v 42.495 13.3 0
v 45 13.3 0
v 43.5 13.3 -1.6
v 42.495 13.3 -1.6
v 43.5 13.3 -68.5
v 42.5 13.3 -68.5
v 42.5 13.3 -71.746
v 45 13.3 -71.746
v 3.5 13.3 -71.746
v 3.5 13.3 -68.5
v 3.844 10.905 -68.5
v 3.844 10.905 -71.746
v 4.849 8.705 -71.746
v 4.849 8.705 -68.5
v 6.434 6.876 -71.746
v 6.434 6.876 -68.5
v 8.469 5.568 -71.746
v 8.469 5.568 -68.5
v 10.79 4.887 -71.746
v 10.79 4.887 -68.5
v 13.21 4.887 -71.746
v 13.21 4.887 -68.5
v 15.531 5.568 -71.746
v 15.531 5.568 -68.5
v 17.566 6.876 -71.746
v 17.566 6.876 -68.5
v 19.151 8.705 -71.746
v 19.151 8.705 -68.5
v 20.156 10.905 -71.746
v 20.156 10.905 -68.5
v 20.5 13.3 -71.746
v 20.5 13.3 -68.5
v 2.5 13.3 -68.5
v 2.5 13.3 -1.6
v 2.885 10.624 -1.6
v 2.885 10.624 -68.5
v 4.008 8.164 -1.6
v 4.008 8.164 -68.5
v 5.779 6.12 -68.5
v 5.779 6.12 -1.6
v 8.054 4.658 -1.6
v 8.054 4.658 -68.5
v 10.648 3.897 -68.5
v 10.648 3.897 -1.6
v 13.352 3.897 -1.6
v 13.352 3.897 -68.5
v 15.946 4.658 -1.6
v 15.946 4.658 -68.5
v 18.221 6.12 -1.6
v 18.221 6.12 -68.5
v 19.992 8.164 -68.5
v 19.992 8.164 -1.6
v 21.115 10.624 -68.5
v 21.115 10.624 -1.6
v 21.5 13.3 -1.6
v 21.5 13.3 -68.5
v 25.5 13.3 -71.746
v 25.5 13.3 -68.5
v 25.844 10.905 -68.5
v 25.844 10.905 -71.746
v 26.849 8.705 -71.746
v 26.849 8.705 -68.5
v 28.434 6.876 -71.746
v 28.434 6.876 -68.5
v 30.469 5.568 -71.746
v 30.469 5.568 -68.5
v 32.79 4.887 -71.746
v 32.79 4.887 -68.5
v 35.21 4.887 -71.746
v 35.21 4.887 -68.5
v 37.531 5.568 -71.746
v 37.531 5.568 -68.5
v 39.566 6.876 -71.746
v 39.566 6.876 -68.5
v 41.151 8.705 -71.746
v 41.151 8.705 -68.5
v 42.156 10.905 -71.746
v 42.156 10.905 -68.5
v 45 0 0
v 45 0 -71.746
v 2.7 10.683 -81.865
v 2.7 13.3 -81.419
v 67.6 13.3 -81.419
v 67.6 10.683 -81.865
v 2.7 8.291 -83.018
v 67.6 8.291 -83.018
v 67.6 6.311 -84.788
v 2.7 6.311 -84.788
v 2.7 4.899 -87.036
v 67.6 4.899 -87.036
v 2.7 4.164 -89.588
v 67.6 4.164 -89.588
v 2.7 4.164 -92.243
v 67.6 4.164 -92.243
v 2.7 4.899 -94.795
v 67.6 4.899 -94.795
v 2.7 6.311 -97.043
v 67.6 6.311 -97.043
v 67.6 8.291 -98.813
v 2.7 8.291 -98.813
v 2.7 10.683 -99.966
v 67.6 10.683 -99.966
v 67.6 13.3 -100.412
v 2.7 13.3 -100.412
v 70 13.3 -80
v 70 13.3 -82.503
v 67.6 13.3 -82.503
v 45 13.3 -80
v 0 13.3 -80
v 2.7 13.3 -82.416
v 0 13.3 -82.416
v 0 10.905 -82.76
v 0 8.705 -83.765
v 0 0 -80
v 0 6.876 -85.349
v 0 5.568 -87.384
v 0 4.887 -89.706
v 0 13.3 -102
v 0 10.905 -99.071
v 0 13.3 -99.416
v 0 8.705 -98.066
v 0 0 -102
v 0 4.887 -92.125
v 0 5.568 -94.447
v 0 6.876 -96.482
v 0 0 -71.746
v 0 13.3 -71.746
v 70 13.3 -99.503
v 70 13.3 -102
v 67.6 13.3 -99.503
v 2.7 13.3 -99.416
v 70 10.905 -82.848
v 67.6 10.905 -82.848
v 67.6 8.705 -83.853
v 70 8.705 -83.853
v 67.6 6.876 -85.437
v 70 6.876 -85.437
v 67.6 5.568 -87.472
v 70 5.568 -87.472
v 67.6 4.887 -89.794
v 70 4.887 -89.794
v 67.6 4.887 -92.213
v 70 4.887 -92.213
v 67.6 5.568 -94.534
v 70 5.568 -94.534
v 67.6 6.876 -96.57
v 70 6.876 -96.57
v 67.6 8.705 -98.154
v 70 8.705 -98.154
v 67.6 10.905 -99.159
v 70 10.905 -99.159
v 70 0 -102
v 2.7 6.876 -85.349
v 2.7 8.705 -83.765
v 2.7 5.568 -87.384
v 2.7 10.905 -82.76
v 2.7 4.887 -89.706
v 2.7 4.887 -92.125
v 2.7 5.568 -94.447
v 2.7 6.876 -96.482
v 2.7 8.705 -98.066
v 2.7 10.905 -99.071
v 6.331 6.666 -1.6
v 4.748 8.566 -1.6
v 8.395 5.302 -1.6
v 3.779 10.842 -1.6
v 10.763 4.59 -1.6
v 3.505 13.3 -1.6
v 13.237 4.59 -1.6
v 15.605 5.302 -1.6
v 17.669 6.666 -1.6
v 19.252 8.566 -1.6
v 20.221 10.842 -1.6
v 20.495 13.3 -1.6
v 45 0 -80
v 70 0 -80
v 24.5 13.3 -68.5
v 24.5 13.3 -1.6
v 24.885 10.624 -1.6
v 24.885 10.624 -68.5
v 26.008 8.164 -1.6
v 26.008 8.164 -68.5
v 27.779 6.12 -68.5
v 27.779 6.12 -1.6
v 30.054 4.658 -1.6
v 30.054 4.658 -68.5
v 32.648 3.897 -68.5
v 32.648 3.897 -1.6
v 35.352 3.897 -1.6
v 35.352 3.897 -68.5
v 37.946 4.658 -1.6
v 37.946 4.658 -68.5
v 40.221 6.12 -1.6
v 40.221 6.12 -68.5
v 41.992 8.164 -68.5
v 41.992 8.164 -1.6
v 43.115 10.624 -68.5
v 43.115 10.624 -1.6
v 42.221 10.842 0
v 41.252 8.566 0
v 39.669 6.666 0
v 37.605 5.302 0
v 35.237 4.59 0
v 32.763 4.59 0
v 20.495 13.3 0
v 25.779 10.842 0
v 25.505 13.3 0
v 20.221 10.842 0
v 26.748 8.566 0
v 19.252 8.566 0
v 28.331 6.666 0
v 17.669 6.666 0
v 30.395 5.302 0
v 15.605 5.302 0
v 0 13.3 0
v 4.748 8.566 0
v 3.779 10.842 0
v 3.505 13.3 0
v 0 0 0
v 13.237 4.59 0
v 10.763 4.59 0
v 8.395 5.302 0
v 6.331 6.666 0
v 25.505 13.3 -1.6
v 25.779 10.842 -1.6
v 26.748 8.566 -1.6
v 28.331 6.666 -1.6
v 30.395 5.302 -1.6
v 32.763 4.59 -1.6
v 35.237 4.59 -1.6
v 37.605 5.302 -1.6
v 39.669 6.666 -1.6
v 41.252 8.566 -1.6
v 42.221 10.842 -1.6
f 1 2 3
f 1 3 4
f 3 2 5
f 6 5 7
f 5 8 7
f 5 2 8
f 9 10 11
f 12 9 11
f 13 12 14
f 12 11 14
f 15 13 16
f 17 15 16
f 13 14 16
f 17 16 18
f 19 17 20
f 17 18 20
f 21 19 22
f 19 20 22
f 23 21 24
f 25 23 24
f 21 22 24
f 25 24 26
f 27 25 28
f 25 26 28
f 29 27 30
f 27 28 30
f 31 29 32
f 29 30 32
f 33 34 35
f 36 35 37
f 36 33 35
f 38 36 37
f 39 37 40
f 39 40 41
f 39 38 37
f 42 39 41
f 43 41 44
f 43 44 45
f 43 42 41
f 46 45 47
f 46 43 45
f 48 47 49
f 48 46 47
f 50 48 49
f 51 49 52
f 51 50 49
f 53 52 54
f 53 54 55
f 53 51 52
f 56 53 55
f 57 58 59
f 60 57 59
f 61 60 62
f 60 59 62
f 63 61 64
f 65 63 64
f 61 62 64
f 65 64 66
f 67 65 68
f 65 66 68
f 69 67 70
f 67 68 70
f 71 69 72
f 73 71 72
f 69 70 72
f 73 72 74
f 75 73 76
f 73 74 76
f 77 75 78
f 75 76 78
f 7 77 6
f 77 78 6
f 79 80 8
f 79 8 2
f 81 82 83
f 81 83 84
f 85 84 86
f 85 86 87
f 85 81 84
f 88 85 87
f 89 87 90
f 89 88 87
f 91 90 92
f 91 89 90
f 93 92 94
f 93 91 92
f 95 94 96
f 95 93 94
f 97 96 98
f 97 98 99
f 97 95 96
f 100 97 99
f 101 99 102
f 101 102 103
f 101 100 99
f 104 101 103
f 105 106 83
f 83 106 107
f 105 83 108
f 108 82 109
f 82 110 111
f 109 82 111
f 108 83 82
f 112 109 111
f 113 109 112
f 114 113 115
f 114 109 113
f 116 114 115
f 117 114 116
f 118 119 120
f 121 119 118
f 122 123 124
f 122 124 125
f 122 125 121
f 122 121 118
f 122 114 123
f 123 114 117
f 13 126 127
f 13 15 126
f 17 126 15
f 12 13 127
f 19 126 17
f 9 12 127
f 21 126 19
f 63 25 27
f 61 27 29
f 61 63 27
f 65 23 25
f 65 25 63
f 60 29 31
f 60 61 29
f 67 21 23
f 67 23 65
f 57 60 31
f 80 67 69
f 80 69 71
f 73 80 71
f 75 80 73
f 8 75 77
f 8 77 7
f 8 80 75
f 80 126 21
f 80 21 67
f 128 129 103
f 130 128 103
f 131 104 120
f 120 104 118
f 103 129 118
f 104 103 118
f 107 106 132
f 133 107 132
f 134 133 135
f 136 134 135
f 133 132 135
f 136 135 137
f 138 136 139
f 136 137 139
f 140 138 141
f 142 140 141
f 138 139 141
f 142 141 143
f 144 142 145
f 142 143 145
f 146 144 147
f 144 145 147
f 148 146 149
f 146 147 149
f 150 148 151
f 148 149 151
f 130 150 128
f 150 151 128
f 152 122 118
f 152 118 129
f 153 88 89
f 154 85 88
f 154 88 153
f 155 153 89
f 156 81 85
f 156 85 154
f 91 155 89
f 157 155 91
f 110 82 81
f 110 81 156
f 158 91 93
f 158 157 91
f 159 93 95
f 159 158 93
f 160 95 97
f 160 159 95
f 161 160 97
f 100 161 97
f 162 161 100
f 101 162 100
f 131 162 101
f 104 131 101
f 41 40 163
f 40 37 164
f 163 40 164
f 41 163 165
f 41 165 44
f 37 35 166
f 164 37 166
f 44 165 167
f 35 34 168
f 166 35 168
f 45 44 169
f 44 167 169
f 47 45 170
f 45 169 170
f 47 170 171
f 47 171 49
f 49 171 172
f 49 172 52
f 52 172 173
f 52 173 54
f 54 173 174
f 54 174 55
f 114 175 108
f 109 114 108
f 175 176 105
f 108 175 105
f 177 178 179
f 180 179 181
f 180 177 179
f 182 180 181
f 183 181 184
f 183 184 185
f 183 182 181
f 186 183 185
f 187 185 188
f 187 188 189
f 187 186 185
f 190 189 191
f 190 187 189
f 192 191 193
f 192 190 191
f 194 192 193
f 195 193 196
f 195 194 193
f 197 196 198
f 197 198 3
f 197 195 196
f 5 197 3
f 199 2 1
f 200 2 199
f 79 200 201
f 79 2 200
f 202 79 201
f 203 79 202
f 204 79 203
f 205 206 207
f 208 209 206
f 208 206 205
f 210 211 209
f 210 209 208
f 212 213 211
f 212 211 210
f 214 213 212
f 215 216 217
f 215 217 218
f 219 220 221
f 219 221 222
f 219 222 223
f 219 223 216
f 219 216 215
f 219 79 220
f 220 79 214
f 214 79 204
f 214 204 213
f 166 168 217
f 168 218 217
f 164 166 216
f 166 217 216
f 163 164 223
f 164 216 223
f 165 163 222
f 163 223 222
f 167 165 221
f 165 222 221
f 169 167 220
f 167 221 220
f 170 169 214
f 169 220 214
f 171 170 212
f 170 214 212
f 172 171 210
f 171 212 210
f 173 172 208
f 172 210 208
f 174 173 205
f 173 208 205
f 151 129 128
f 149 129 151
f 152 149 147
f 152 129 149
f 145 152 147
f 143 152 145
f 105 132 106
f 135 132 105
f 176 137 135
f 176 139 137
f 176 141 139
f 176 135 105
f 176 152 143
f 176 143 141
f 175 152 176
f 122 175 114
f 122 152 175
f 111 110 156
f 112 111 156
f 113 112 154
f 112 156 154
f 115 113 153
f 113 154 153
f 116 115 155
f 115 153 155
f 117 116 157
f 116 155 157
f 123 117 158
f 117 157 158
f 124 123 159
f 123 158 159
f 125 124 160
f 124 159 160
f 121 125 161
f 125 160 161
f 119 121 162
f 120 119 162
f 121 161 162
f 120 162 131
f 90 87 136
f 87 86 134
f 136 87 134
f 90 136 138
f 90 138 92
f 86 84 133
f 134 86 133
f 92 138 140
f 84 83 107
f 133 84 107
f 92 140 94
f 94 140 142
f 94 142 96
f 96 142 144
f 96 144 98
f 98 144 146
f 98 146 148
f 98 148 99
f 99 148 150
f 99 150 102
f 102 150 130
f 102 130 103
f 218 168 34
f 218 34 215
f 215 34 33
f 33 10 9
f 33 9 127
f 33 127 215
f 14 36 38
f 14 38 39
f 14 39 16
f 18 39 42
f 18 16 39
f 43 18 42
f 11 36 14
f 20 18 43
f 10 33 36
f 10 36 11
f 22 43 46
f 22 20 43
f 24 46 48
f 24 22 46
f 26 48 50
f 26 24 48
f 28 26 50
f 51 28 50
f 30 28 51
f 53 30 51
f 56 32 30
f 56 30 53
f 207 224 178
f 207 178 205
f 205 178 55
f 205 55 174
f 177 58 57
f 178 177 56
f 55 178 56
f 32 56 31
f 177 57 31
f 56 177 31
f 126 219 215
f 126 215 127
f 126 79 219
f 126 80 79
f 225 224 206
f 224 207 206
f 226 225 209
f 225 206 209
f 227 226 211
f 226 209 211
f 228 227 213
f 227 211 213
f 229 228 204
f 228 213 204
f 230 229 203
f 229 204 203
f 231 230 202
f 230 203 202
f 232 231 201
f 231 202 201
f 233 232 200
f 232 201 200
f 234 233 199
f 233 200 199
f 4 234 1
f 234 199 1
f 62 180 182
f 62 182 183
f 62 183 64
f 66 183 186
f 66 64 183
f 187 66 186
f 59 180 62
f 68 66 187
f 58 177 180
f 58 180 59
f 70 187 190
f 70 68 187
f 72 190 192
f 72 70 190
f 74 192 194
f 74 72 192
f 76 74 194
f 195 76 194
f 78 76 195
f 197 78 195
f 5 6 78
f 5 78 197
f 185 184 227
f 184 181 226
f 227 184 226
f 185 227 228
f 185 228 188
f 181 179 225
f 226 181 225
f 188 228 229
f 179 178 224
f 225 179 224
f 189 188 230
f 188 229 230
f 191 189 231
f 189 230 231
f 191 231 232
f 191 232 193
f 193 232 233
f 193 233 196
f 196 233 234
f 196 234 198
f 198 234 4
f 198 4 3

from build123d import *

# Parameters (mm, degrees)
BOSS_EXTRU_1_DEPTH           = 13.3
ESQUISSE2_R                  = 8.5
ENL_V_MAT_EXTRU_1_DEPTH      = 68
ENL_V_MAT_EXTRU_2_DEPTH      = 66.4
ENL_V_MAT_EXTRU_2_DEPTH_BACK = 0.5
ESQUISSE3_R                  = 9.5
ESQUISSE5_W                  = 8.253832041
ESQUISSE5_H                  = 13.3
ENL_V_MAT_EXTRU_3_DEPTH      = 113.275954683
ESQUISSE7_R                  = 8.5
ENL_V_MAT_EXTRU_5_DEPTH      = 4
ESQUISSE6_R                  = 8.5
ENL_V_MAT_EXTRU_4_DEPTH      = 67.3
ESQUISSE8_R                  = 9.5
ENL_V_MAT_EXTRU_6_DEPTH      = 64.9
ESQUISSE9_R                  = 8.5
ENL_V_MAT_EXTRU_7_DEPTH      = 64.2


with BuildPart() as part:
    # Esquisse1 → Boss.-Extru.1 (new body)
    with BuildSketch(Plane(origin=(0, 0, 0), x_dir=(1, 0, 0), z_dir=(0, 1, 0))):
        Polygon((0, 0), (0, 102), (70, 102), (70, 80), (45, 80), (45, 0), align=None)
    extrude(amount=BOSS_EXTRU_1_DEPTH)

    # Esquisse2 → Enlèv. mat.-Extru.1 (cut)
    with BuildSketch(Plane.XY):
        with Locations((12, 13)):
            Circle(ESQUISSE2_R)
        with Locations((34, 13)):
            Circle(ESQUISSE2_R)
    extrude(amount=-ENL_V_MAT_EXTRU_1_DEPTH, mode=Mode.SUBTRACT)

    # Esquisse3 → Enlèv. mat.-Extru.2 (cut, two sides: drawn at the far end of the back side and taken through both)
    with BuildSketch(Plane.XY.offset(-68).offset(-ENL_V_MAT_EXTRU_2_DEPTH_BACK)):
        with Locations((12, 13.3)):
            Circle(ESQUISSE3_R)
        with Locations((34, 13.3)):
            Circle(ESQUISSE3_R)
    extrude(amount=ENL_V_MAT_EXTRU_2_DEPTH + ENL_V_MAT_EXTRU_2_DEPTH_BACK, mode=Mode.SUBTRACT)

    # Esquisse5 → Enlèv. mat.-Extru.3 (cut, through all)
    with BuildSketch(Plane(origin=(45, 0, 0), x_dir=(0, 0, -1), z_dir=(1, 0, 0))):
        with Locations((75.873083979, 6.65)):
            Rectangle(ESQUISSE5_W, ESQUISSE5_H)
    extrude(amount=-ENL_V_MAT_EXTRU_3_DEPTH, mode=Mode.SUBTRACT)


with BuildPart() as enl_v_mat_extru_3_piece_1:
    # of the separate pieces the step leaves, piece 1, a body of its own (enl_v_mat_extru_3_pieces)
    add(part.part.solids().sort_by_distance((0, 0, 0))[0])

    # Esquisse7 → Enlèv. mat.-Extru.5 (cut)
    with BuildSketch(Plane.XY.offset(-68.5)):
        with Locations((34, 13.3)):
            Circle(ESQUISSE7_R)
        with Locations((12, 13.3)):
            Circle(ESQUISSE7_R)
    extrude(amount=-ENL_V_MAT_EXTRU_5_DEPTH, mode=Mode.SUBTRACT)


with BuildPart() as enl_v_mat_extru_3_piece_2:
    # of the separate pieces the step leaves, piece 2, a body of its own (enl_v_mat_extru_3_pieces)
    add(part.part.solids().sort_by_distance((0, 0, -80))[0])

    # Esquisse6 → Enlèv. mat.-Extru.4 (cut)
    with BuildSketch(Plane(origin=(70, 0, 0), x_dir=(0, 0, -1), z_dir=(1, 0, 0))):
        with Locations((91.003264198, 13.3)):
            Circle(ESQUISSE6_R)
    extrude(amount=-ENL_V_MAT_EXTRU_4_DEPTH, mode=Mode.SUBTRACT)

    # Esquisse8 → Enlèv. mat.-Extru.6 (cut)
    with BuildSketch(Plane(origin=(2.7, 0, 0), x_dir=(0, 0, -1), z_dir=(1, 0, 0))):
        with Locations((90.915521259, 13.571033135)):
            Circle(ESQUISSE8_R)
    extrude(amount=ENL_V_MAT_EXTRU_6_DEPTH, mode=Mode.SUBTRACT)

    # Esquisse9 → Enlèv. mat.-Extru.7 (cut)
    with BuildSketch(Plane(origin=(2.7, 0, 0), x_dir=(0, 0, -1), z_dir=(1, 0, 0))):
        with Locations((90.915521259, 13.3)):
            Circle(ESQUISSE9_R)
    extrude(amount=-ENL_V_MAT_EXTRU_7_DEPTH, mode=Mode.SUBTRACT)


solid = Compound([enl_v_mat_extru_3_piece_1.part, enl_v_mat_extru_3_piece_2.part])
